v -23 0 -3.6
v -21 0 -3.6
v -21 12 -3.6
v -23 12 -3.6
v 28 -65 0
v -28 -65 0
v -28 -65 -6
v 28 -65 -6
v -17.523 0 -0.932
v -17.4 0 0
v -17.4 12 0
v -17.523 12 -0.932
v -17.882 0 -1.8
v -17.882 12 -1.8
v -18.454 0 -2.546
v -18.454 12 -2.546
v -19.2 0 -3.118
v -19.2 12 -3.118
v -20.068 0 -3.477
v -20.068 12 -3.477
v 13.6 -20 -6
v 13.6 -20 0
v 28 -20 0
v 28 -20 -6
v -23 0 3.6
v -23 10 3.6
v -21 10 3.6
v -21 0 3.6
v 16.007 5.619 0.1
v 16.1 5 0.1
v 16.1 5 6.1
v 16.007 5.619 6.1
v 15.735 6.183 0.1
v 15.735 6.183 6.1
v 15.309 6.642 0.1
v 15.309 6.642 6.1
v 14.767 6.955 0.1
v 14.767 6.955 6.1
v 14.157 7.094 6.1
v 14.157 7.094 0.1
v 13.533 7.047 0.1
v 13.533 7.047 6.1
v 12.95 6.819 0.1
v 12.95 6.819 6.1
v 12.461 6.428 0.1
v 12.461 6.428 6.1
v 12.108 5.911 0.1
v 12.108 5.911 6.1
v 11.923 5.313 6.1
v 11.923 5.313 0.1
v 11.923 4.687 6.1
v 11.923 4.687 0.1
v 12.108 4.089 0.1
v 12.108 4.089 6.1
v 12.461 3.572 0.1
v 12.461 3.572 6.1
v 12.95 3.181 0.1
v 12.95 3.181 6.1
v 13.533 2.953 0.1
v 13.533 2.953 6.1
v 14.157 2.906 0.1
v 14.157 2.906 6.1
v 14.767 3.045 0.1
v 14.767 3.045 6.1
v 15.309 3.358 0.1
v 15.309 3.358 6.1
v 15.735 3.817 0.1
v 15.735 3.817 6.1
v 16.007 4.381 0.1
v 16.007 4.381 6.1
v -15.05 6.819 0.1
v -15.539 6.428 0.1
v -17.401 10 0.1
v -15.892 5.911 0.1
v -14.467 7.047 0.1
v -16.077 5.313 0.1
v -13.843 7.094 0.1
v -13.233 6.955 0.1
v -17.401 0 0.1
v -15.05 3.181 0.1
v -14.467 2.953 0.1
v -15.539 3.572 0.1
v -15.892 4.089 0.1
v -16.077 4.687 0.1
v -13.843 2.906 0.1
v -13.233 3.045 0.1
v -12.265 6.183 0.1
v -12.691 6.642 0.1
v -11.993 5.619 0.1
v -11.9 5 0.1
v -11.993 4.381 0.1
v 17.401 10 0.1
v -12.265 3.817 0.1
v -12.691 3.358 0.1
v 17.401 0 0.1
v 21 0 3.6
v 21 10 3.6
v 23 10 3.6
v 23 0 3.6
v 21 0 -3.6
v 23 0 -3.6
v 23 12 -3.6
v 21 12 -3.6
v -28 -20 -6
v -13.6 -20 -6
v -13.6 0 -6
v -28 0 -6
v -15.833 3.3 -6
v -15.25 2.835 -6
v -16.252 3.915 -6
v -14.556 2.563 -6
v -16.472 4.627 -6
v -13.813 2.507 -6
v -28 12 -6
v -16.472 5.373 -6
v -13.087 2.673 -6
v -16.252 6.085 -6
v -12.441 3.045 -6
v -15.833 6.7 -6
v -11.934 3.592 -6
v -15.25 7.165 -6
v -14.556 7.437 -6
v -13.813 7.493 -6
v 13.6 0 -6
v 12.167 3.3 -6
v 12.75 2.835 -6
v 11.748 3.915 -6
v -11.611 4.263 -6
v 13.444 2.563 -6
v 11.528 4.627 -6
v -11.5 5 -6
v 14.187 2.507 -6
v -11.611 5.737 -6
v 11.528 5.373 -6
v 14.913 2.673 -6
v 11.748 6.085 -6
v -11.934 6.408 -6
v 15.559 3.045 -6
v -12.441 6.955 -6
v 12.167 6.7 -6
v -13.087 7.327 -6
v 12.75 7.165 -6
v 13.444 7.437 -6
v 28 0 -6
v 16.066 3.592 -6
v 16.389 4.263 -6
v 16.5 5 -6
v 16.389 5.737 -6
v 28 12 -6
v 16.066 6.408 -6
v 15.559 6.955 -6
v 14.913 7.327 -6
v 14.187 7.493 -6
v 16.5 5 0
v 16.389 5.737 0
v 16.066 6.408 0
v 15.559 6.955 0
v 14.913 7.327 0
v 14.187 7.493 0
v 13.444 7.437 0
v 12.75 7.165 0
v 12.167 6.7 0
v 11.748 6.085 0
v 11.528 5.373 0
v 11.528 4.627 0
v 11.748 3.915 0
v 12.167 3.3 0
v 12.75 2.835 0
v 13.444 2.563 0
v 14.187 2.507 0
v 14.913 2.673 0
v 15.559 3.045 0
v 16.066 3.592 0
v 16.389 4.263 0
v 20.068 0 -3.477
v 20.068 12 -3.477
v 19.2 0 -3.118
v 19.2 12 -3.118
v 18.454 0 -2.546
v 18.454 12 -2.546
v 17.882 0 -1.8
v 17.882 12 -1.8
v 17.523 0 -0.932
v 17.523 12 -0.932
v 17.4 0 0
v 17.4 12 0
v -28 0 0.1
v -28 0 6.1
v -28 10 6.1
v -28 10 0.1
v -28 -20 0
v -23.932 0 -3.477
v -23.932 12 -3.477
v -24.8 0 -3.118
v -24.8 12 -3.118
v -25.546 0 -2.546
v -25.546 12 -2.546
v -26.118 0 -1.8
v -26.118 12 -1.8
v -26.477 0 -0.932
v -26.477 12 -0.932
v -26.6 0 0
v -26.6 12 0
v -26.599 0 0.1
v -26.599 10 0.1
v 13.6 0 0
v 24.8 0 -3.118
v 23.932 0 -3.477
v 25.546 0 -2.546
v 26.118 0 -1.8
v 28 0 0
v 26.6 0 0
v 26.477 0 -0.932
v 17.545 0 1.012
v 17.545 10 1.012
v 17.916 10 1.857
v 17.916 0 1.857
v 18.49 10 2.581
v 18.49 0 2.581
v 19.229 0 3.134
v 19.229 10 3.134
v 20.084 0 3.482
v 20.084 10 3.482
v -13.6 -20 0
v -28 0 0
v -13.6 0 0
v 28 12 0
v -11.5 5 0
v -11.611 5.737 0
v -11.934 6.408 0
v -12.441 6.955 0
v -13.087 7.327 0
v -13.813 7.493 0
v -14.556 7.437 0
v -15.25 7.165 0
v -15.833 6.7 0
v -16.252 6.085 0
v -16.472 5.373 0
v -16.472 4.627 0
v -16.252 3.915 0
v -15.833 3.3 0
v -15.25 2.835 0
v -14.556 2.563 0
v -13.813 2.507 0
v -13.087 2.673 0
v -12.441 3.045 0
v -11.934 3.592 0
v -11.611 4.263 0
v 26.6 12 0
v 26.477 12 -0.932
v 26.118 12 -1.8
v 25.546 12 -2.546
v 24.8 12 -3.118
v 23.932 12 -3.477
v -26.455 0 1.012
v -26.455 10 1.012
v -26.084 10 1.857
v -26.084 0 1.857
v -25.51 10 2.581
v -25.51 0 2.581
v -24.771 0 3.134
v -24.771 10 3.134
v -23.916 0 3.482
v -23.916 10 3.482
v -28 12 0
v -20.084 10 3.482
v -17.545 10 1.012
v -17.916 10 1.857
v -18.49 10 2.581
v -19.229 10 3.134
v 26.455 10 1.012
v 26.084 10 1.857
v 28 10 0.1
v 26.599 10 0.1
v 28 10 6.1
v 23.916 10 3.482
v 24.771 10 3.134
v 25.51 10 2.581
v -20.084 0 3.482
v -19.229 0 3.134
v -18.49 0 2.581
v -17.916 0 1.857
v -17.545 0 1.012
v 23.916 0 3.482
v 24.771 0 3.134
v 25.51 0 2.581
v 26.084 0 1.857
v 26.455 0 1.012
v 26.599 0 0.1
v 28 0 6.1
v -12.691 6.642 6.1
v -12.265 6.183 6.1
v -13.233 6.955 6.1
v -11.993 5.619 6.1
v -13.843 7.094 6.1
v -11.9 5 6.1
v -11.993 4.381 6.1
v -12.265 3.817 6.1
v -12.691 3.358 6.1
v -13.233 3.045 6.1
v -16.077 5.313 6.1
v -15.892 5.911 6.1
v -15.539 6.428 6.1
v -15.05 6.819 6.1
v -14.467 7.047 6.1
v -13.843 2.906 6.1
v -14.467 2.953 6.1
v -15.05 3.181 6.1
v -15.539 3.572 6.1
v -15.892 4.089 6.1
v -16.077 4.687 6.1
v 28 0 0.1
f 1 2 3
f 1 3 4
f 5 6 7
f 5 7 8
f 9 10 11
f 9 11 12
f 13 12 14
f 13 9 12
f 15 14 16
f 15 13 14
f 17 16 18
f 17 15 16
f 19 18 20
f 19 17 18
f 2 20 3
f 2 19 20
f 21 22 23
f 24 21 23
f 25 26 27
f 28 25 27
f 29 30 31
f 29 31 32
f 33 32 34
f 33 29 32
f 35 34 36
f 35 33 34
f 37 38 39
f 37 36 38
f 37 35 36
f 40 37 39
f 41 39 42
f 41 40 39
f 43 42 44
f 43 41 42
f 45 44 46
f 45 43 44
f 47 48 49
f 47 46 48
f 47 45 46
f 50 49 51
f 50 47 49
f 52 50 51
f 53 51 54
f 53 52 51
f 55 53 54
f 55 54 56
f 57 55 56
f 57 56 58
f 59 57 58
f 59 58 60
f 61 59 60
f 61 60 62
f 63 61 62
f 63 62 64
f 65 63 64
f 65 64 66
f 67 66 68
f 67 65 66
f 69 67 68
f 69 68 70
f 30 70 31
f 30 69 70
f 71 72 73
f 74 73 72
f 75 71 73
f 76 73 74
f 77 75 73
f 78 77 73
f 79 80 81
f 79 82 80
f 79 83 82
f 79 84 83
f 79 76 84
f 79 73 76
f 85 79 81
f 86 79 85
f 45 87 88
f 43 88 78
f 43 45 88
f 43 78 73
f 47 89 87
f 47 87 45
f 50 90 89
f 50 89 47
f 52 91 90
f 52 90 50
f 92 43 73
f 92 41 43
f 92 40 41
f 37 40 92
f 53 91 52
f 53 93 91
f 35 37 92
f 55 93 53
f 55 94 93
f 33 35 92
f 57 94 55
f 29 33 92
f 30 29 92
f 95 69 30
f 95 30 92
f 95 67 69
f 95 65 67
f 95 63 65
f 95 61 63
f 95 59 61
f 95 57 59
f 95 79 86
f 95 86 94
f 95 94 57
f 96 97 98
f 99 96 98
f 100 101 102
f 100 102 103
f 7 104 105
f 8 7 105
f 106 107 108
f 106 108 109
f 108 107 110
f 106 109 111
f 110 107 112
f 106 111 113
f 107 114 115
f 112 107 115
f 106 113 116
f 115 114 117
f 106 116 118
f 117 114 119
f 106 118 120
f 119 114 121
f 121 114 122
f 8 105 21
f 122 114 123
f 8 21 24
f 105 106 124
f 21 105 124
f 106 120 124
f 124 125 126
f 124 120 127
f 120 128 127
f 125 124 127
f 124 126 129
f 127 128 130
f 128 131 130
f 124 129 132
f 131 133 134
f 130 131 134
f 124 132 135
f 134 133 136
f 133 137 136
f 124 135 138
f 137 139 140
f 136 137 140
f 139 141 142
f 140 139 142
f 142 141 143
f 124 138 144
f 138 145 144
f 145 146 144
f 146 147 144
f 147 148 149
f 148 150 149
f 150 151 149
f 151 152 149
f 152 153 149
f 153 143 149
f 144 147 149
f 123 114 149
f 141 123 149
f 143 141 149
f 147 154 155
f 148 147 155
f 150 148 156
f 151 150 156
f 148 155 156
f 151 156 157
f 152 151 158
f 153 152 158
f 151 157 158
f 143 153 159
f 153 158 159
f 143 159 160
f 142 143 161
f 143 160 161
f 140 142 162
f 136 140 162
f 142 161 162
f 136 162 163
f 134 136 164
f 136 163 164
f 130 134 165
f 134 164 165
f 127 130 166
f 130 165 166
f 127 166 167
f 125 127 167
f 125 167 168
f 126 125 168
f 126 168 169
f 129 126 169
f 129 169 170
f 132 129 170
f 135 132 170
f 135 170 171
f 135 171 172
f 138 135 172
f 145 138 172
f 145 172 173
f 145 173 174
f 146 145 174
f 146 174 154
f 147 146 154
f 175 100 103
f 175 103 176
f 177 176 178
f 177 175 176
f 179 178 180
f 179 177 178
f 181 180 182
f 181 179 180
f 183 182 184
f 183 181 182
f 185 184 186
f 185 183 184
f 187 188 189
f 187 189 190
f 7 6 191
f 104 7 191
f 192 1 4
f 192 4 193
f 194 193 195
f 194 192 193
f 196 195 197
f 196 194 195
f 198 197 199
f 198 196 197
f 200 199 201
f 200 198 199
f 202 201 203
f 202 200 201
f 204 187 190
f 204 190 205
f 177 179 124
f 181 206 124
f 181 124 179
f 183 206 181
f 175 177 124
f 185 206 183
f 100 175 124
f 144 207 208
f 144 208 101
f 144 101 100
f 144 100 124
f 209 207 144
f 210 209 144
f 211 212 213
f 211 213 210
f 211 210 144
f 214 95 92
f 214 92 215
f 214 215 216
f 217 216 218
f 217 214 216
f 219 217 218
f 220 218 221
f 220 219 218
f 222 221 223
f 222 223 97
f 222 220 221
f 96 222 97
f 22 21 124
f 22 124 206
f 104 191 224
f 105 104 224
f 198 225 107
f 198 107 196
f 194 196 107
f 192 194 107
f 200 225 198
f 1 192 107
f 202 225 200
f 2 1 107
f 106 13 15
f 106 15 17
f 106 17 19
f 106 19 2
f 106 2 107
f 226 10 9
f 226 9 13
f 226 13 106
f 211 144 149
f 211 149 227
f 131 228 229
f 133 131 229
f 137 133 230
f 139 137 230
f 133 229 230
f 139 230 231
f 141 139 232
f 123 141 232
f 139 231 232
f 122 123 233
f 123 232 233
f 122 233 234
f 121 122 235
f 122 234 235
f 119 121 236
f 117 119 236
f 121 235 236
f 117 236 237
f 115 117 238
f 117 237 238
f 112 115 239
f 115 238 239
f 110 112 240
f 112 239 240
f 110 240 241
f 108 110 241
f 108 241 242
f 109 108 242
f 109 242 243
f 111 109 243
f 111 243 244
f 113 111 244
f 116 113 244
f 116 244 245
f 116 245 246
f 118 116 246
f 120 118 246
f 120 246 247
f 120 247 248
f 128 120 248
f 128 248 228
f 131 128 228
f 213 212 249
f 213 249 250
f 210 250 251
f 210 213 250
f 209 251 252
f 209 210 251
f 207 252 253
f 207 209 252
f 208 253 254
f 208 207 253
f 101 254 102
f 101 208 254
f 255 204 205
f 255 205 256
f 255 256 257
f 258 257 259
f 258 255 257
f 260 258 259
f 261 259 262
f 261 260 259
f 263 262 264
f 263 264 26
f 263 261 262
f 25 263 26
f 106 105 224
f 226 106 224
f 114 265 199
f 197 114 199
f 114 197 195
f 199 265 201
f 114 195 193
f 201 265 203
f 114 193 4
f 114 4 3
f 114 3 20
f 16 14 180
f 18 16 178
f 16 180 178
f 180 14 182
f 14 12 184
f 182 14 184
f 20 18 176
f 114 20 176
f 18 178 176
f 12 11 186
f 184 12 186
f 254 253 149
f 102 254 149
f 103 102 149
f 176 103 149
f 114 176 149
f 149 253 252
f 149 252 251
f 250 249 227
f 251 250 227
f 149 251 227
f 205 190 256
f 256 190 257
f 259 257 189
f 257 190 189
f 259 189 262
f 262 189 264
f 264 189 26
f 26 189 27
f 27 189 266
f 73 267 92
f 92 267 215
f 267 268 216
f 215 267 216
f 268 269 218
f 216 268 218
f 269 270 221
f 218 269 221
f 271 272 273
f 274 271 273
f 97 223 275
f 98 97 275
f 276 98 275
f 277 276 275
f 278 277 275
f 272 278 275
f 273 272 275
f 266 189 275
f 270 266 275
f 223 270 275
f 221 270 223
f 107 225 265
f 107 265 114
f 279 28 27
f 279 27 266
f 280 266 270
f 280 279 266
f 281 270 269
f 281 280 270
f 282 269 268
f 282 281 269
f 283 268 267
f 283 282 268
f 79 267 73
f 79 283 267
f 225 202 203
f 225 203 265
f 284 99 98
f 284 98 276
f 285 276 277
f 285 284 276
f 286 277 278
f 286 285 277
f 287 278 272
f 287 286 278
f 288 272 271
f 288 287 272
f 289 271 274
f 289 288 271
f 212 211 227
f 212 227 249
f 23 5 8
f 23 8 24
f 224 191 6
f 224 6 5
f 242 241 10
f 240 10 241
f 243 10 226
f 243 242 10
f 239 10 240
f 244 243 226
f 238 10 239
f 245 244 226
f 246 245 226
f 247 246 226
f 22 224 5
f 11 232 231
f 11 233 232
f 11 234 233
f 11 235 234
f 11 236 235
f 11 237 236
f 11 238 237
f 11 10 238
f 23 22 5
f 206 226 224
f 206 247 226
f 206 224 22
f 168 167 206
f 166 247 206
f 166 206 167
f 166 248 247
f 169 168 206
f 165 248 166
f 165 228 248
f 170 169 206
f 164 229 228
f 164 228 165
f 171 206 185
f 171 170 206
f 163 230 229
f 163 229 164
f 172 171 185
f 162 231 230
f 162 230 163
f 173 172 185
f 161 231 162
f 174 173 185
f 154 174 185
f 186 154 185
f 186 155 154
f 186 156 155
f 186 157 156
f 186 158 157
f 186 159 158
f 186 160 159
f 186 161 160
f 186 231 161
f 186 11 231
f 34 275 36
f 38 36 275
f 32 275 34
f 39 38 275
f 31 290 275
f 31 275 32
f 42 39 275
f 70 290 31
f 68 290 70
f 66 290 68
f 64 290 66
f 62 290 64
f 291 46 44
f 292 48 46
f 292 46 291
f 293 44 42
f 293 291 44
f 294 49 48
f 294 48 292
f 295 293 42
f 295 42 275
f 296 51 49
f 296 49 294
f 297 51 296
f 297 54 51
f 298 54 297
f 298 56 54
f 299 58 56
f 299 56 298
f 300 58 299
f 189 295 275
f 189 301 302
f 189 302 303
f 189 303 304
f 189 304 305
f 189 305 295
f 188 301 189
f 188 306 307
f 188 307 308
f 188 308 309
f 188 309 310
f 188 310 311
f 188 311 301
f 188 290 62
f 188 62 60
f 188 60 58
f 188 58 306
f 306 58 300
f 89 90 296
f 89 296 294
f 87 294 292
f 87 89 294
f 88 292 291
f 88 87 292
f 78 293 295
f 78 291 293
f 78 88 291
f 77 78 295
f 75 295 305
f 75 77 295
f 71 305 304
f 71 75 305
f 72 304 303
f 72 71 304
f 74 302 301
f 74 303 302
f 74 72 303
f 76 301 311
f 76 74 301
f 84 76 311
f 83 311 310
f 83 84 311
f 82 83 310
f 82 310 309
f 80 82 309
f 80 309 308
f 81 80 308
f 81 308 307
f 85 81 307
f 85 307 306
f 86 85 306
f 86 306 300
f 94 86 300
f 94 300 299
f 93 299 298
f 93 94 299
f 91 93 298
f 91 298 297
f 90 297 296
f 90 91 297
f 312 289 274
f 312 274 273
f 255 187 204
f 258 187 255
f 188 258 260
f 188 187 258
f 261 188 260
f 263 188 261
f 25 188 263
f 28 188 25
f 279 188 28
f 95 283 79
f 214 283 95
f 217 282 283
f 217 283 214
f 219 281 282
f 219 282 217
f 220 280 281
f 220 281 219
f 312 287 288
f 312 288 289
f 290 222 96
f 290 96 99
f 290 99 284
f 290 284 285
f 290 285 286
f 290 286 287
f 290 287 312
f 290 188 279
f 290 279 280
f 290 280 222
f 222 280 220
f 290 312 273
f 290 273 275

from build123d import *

# Parameters (mm, degrees)
F0_W      = 13.6
F0_H      = 6
F0_W_2    = 3.8
F1_DEPTH  = 12
F4_DEPTH  = 10
F3_R      = 2.1
F5_DEPTH  = 25
F3_R_2    = 2.5
F6_DEPTH  = 25
F8_DEPTH  = 65
F9_W      = 14.4
F9_H      = 45
F10_DEPTH = 6


# Not quite as in the source:
# - a feature of the source that left no trace in its solid (it failed there, or was rolled back) is left out


with BuildPart() as f1:
    # F0 (on Front) → F1 (new body)
    with BuildSketch(Plane.XZ):
        with Locations((6.8, -3)):
            Rectangle(F0_W, F0_H)
        with Locations((15.5, -3)):
            Rectangle(F0_W_2, F0_H)
        with Locations((-15.5, -3)):
            Rectangle(F0_W_2, F0_H)
        with Locations((-6.8, -3)):
            Rectangle(F0_W, F0_H)
        with BuildLine():
            Line((-17.4, -6), (-17.4, 0))
            ThreePointArc((-17.4, 0), (-18.4544155877, -2.5455844123), (-21, -3.6))
            Line((-21, -3.6), (-23, -3.6))
            ThreePointArc((-23, -3.6), (-25.5455844123, -2.5455844123), (-26.6, 0))
            Line((-26.6, 0), (-28, 0))
            Line((-28, 0), (-28, -6))
            Line((-28, -6), (-17.4, -6))
        make_face()
        with BuildLine():
            ThreePointArc((21, -3.6), (18.4544155877, -2.5455844123), (17.4, 0))
            Line((17.4, 0), (17.4, -6))
            Line((17.4, -6), (28, -6))
            Line((28, -6), (28, 0))
            Line((28, 0), (26.6, 0))
            ThreePointArc((26.6, 0), (25.5455844123, -2.5455844123), (23, -3.6))
            Line((23, -3.6), (21, -3.6))
        make_face()
    extrude(amount=-F1_DEPTH)

    # F3 (on Top) → F6 (cut)
    with BuildSketch(Plane.XY):
        with Locations((-14, 5)):
            Circle(F3_R_2)
        with Locations((-14, 5)):
            Circle(F3_R, mode=Mode.SUBTRACT)
        with Locations((14, 5)):
            Circle(F3_R_2)
        with Locations((14, 5)):
            Circle(F3_R, mode=Mode.SUBTRACT)
        with Locations((-14, 5)):
            Circle(F3_R)
        with Locations((14, 5)):
            Circle(F3_R)
    extrude(amount=-F6_DEPTH, mode=Mode.SUBTRACT)

    # F0 (on Front) → F8 (join)
    with BuildSketch(Plane.XZ):
        with Locations((-6.8, -3)):
            Rectangle(F0_W, F0_H)
        with Locations((6.8, -3)):
            Rectangle(F0_W, F0_H)
    extrude(amount=F8_DEPTH)

    # F9 (on face) → F10 (join)
    with BuildSketch(Plane.XY):
        with Locations((-20.8, -42.5)):
            Rectangle(F9_W, F9_H)
        with Locations((20.8, -42.5)):
            Rectangle(F9_W, F9_H)
    extrude(amount=-F10_DEPTH)


with BuildPart() as f4:
    # F0 (on Front) → F4 (new body)
    with BuildSketch(Plane.XZ):
        with BuildLine():
            Line((-17.4013891569, 0.1), (17.4013891569, 0.1))
            ThreePointArc((17.4013891569, 0.1), (18.4900199204, 2.5806975801), (21, 3.6))
            Line((21, 3.6), (23, 3.6))
            ThreePointArc((23, 3.6), (25.5099800796, 2.5806975801), (26.5986108431, 0.1))
            Line((26.5986108431, 0.1), (28, 0.1))
            Line((28, 0.1), (28, 6.1))
            Line((28, 6.1), (-28, 6.1))
            Line((-28, 6.1), (-28, 0.1))
            Line((-28, 0.1), (-26.5986108431, 0.1))
            ThreePointArc((-26.5986108431, 0.1), (-25.5099800796, 2.5806975801), (-23, 3.6))
            Line((-23, 3.6), (-21, 3.6))
            ThreePointArc((-21, 3.6), (-18.4900199204, 2.5806975801), (-17.4013891569, 0.1))
        make_face()
    extrude(amount=-F4_DEPTH)

    # F3 (on Top) → F5 (cut)
    with BuildSketch(Plane.XY):
        with Locations((14, 5)):
            Circle(F3_R)
        with Locations((-14, 5)):
            Circle(F3_R)
    extrude(amount=F5_DEPTH, mode=Mode.SUBTRACT)


solid = Compound([f1.part, f4.part])
